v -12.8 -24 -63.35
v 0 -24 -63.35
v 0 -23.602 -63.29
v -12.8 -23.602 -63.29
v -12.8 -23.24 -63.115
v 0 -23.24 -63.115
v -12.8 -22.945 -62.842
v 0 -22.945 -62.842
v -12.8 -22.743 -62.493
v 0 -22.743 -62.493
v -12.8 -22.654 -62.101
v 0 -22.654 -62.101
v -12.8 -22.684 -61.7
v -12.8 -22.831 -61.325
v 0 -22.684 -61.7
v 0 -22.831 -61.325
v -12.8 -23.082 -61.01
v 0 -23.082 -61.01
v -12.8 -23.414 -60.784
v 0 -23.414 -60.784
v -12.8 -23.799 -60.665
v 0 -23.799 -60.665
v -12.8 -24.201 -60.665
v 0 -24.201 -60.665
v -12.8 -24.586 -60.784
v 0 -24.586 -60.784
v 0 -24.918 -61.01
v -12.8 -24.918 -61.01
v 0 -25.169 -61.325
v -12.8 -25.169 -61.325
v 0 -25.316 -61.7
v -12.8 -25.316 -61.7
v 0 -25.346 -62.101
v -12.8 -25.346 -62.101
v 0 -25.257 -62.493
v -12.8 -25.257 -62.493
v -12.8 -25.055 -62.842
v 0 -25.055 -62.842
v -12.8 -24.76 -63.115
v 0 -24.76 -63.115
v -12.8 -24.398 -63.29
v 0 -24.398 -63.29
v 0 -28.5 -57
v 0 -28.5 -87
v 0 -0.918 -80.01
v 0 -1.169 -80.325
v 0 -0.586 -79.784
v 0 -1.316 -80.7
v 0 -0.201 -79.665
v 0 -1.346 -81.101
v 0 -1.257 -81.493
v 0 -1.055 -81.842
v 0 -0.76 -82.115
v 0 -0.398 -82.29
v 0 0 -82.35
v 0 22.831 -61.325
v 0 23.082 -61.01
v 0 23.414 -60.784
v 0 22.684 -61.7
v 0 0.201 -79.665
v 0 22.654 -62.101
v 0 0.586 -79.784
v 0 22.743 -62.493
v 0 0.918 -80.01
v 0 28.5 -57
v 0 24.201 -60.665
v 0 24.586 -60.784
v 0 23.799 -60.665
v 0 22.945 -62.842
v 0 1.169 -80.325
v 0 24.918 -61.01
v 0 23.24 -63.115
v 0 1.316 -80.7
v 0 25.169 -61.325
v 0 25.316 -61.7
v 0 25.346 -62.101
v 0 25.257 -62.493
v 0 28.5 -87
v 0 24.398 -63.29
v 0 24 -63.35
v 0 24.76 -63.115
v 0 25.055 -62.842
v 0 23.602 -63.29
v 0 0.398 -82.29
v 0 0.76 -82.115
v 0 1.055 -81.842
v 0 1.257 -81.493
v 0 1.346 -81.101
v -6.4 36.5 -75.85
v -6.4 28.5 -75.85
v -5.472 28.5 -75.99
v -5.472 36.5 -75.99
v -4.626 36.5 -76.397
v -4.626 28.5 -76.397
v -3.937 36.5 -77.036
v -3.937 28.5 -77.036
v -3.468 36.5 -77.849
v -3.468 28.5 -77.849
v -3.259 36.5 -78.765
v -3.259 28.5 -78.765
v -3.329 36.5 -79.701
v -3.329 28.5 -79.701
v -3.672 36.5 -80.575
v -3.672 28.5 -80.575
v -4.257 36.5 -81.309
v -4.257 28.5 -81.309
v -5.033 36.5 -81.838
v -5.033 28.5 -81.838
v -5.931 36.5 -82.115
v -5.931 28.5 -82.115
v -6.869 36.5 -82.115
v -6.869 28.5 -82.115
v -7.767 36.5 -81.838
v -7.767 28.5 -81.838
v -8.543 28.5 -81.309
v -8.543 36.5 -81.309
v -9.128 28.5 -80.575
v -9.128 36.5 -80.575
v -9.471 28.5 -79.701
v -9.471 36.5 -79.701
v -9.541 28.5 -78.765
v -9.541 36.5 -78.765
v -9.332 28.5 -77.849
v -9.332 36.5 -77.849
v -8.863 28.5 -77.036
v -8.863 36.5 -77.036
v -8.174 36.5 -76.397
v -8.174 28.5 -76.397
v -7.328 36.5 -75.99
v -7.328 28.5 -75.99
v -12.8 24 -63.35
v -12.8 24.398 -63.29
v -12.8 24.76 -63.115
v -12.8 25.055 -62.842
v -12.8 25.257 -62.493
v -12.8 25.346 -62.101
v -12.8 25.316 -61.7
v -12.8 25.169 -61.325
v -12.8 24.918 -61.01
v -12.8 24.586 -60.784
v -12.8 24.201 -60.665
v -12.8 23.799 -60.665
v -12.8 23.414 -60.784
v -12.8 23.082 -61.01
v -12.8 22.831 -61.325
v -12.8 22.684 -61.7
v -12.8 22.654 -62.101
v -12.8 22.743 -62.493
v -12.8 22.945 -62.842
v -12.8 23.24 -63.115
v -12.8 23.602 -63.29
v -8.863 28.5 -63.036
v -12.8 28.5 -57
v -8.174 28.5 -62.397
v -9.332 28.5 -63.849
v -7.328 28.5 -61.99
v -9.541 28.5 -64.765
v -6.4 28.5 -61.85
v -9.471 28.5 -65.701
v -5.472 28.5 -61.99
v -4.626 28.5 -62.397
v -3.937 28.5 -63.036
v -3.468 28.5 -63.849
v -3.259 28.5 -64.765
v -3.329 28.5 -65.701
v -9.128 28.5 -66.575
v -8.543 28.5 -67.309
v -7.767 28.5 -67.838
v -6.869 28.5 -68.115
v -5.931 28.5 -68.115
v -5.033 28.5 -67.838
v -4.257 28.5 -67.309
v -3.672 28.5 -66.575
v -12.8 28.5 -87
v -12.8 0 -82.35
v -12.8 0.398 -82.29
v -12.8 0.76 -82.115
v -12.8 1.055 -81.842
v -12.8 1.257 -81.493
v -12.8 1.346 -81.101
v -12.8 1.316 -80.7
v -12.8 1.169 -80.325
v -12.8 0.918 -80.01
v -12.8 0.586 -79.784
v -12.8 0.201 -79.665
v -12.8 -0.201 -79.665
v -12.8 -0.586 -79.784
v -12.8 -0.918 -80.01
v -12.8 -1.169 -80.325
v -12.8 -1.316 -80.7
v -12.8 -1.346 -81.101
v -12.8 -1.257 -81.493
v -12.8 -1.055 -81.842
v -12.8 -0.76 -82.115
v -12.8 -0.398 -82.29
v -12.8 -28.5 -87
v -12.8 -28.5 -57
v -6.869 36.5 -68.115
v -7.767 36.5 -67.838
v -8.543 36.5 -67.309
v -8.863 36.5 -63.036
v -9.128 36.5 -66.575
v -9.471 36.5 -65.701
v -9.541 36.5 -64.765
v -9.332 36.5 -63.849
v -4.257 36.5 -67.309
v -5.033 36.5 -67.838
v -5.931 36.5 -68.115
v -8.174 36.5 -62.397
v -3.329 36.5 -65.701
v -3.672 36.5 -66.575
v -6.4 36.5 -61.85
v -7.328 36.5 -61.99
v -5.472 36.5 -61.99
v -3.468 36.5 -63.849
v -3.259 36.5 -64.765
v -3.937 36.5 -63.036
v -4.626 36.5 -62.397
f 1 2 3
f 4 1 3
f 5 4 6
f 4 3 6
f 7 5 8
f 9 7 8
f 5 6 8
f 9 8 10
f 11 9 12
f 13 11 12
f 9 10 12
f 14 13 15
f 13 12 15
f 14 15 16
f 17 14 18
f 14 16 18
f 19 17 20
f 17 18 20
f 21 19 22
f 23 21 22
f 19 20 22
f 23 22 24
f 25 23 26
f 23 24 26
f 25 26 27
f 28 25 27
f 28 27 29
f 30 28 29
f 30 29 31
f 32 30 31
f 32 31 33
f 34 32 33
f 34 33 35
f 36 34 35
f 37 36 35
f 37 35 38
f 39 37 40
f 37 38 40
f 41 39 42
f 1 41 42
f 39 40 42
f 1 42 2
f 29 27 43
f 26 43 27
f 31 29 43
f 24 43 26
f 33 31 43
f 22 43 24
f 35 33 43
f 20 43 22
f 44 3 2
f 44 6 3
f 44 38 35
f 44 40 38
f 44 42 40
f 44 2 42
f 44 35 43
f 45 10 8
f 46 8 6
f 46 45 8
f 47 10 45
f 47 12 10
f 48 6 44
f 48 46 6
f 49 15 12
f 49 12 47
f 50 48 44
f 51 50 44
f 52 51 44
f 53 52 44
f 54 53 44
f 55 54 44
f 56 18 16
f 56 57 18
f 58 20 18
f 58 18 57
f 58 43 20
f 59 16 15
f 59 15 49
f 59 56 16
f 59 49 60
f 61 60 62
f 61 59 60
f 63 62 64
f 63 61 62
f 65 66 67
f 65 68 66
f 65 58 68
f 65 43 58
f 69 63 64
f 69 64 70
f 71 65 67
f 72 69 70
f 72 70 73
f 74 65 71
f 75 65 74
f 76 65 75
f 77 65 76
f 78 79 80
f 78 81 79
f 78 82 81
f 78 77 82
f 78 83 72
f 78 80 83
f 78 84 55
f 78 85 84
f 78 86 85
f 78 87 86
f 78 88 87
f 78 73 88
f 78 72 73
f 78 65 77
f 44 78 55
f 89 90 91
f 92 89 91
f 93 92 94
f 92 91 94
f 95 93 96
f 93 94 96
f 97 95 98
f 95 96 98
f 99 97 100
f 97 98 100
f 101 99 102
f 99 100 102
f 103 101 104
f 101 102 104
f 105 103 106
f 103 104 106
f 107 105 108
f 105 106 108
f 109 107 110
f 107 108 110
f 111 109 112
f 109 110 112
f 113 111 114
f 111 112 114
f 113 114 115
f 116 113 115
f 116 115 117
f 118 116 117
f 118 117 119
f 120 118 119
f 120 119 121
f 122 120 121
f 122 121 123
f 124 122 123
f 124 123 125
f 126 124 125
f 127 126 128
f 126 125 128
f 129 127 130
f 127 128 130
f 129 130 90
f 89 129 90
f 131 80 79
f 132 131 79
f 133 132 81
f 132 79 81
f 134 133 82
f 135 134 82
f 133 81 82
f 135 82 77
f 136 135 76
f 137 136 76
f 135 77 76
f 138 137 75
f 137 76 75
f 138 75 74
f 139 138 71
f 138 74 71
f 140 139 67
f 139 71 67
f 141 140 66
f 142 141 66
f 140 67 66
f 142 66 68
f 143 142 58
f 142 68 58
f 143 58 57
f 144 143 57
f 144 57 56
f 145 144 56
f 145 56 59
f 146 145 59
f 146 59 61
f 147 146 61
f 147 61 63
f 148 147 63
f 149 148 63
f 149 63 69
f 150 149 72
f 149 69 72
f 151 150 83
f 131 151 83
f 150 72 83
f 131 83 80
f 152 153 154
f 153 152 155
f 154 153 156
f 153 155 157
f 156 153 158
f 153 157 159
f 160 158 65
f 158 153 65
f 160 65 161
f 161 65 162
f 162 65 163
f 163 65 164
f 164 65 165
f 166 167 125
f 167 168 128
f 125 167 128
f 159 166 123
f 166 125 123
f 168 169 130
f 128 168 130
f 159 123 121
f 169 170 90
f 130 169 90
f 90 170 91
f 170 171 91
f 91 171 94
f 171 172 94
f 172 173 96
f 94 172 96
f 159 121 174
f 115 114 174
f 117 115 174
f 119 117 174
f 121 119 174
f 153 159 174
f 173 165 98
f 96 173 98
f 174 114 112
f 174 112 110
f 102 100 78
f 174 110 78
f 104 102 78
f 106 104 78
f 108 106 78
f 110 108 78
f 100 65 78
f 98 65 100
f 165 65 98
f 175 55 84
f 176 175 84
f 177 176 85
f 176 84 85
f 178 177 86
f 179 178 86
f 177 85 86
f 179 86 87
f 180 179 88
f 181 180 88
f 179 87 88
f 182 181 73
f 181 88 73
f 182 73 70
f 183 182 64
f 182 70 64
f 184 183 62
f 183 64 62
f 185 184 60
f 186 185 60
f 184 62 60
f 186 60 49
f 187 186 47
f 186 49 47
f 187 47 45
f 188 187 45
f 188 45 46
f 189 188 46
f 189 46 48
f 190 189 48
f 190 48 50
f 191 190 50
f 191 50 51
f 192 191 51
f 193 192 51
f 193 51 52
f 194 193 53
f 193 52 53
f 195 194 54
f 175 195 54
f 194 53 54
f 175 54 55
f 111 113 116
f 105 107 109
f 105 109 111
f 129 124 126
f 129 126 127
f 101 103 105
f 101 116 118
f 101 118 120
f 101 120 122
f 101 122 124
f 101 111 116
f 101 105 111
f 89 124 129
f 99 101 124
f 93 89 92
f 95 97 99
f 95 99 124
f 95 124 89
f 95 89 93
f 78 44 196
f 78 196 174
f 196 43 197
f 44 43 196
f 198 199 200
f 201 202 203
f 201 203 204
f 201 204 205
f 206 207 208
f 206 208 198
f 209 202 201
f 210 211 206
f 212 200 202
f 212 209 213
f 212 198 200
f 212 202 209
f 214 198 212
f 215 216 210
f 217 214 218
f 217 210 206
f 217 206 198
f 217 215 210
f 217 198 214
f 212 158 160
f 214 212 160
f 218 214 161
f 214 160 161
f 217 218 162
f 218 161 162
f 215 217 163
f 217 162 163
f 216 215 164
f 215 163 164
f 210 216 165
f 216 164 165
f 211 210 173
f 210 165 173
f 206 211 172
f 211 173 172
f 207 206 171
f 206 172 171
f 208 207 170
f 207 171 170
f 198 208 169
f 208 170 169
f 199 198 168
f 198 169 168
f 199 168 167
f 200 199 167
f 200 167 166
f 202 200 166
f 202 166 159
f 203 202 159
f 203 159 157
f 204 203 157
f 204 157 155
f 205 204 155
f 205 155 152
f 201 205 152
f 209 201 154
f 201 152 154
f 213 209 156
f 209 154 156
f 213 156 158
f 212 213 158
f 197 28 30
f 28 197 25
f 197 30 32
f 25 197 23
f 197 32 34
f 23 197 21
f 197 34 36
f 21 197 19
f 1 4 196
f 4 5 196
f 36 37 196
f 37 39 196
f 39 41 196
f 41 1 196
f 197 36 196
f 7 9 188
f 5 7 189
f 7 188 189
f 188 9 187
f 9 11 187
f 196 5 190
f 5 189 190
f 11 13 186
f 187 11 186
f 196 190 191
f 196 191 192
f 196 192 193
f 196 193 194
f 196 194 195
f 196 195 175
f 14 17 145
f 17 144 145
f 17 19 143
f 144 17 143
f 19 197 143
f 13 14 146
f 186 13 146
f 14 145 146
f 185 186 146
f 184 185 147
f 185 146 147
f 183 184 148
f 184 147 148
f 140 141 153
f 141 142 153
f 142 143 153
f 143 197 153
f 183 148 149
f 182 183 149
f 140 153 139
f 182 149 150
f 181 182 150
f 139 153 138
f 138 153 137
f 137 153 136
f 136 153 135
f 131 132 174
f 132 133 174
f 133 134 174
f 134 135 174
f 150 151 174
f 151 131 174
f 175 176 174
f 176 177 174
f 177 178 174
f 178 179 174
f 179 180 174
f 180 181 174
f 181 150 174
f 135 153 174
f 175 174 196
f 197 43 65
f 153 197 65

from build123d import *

# Parameters (mm, degrees)
CASE_SKETCH_W  = 30
CASE_SKETCH_H  = 57
CASE_SKETCH_R  = 1.35
CASE_2_DEPTH   = 12.8
PORTS_START    = 28.5
PORTS_SKETCH_R = 3.15
PORTS_DEPTH    = 8


with BuildPart() as part:
    # Case Sketch → Case 2 (new body)
    with BuildSketch(Plane(origin=(0, 0, 0), x_dir=(0, 0, -1), z_dir=(1, 0, 0))):
        with Locations((72, 0)):
            Rectangle(CASE_SKETCH_W, CASE_SKETCH_H)
        with Locations((62, -24)):
            Circle(CASE_SKETCH_R, mode=Mode.SUBTRACT)
        with Locations((62, 24)):
            Circle(CASE_SKETCH_R, mode=Mode.SUBTRACT)
        with Locations((81, 0)):
            Circle(CASE_SKETCH_R, mode=Mode.SUBTRACT)
    extrude(amount=-CASE_2_DEPTH)

    # Ports Sketch → Ports (add)
    with BuildSketch(Plane(origin=(0, 0, 0), x_dir=(1, 0, 0), z_dir=(0, 1, 0)).offset(PORTS_START)):
        with Locations((-6.4, 65)):
            Circle(PORTS_SKETCH_R)
        with Locations((-6.4, 79)):
            Circle(PORTS_SKETCH_R)
    extrude(amount=PORTS_DEPTH)


solid = part.part
